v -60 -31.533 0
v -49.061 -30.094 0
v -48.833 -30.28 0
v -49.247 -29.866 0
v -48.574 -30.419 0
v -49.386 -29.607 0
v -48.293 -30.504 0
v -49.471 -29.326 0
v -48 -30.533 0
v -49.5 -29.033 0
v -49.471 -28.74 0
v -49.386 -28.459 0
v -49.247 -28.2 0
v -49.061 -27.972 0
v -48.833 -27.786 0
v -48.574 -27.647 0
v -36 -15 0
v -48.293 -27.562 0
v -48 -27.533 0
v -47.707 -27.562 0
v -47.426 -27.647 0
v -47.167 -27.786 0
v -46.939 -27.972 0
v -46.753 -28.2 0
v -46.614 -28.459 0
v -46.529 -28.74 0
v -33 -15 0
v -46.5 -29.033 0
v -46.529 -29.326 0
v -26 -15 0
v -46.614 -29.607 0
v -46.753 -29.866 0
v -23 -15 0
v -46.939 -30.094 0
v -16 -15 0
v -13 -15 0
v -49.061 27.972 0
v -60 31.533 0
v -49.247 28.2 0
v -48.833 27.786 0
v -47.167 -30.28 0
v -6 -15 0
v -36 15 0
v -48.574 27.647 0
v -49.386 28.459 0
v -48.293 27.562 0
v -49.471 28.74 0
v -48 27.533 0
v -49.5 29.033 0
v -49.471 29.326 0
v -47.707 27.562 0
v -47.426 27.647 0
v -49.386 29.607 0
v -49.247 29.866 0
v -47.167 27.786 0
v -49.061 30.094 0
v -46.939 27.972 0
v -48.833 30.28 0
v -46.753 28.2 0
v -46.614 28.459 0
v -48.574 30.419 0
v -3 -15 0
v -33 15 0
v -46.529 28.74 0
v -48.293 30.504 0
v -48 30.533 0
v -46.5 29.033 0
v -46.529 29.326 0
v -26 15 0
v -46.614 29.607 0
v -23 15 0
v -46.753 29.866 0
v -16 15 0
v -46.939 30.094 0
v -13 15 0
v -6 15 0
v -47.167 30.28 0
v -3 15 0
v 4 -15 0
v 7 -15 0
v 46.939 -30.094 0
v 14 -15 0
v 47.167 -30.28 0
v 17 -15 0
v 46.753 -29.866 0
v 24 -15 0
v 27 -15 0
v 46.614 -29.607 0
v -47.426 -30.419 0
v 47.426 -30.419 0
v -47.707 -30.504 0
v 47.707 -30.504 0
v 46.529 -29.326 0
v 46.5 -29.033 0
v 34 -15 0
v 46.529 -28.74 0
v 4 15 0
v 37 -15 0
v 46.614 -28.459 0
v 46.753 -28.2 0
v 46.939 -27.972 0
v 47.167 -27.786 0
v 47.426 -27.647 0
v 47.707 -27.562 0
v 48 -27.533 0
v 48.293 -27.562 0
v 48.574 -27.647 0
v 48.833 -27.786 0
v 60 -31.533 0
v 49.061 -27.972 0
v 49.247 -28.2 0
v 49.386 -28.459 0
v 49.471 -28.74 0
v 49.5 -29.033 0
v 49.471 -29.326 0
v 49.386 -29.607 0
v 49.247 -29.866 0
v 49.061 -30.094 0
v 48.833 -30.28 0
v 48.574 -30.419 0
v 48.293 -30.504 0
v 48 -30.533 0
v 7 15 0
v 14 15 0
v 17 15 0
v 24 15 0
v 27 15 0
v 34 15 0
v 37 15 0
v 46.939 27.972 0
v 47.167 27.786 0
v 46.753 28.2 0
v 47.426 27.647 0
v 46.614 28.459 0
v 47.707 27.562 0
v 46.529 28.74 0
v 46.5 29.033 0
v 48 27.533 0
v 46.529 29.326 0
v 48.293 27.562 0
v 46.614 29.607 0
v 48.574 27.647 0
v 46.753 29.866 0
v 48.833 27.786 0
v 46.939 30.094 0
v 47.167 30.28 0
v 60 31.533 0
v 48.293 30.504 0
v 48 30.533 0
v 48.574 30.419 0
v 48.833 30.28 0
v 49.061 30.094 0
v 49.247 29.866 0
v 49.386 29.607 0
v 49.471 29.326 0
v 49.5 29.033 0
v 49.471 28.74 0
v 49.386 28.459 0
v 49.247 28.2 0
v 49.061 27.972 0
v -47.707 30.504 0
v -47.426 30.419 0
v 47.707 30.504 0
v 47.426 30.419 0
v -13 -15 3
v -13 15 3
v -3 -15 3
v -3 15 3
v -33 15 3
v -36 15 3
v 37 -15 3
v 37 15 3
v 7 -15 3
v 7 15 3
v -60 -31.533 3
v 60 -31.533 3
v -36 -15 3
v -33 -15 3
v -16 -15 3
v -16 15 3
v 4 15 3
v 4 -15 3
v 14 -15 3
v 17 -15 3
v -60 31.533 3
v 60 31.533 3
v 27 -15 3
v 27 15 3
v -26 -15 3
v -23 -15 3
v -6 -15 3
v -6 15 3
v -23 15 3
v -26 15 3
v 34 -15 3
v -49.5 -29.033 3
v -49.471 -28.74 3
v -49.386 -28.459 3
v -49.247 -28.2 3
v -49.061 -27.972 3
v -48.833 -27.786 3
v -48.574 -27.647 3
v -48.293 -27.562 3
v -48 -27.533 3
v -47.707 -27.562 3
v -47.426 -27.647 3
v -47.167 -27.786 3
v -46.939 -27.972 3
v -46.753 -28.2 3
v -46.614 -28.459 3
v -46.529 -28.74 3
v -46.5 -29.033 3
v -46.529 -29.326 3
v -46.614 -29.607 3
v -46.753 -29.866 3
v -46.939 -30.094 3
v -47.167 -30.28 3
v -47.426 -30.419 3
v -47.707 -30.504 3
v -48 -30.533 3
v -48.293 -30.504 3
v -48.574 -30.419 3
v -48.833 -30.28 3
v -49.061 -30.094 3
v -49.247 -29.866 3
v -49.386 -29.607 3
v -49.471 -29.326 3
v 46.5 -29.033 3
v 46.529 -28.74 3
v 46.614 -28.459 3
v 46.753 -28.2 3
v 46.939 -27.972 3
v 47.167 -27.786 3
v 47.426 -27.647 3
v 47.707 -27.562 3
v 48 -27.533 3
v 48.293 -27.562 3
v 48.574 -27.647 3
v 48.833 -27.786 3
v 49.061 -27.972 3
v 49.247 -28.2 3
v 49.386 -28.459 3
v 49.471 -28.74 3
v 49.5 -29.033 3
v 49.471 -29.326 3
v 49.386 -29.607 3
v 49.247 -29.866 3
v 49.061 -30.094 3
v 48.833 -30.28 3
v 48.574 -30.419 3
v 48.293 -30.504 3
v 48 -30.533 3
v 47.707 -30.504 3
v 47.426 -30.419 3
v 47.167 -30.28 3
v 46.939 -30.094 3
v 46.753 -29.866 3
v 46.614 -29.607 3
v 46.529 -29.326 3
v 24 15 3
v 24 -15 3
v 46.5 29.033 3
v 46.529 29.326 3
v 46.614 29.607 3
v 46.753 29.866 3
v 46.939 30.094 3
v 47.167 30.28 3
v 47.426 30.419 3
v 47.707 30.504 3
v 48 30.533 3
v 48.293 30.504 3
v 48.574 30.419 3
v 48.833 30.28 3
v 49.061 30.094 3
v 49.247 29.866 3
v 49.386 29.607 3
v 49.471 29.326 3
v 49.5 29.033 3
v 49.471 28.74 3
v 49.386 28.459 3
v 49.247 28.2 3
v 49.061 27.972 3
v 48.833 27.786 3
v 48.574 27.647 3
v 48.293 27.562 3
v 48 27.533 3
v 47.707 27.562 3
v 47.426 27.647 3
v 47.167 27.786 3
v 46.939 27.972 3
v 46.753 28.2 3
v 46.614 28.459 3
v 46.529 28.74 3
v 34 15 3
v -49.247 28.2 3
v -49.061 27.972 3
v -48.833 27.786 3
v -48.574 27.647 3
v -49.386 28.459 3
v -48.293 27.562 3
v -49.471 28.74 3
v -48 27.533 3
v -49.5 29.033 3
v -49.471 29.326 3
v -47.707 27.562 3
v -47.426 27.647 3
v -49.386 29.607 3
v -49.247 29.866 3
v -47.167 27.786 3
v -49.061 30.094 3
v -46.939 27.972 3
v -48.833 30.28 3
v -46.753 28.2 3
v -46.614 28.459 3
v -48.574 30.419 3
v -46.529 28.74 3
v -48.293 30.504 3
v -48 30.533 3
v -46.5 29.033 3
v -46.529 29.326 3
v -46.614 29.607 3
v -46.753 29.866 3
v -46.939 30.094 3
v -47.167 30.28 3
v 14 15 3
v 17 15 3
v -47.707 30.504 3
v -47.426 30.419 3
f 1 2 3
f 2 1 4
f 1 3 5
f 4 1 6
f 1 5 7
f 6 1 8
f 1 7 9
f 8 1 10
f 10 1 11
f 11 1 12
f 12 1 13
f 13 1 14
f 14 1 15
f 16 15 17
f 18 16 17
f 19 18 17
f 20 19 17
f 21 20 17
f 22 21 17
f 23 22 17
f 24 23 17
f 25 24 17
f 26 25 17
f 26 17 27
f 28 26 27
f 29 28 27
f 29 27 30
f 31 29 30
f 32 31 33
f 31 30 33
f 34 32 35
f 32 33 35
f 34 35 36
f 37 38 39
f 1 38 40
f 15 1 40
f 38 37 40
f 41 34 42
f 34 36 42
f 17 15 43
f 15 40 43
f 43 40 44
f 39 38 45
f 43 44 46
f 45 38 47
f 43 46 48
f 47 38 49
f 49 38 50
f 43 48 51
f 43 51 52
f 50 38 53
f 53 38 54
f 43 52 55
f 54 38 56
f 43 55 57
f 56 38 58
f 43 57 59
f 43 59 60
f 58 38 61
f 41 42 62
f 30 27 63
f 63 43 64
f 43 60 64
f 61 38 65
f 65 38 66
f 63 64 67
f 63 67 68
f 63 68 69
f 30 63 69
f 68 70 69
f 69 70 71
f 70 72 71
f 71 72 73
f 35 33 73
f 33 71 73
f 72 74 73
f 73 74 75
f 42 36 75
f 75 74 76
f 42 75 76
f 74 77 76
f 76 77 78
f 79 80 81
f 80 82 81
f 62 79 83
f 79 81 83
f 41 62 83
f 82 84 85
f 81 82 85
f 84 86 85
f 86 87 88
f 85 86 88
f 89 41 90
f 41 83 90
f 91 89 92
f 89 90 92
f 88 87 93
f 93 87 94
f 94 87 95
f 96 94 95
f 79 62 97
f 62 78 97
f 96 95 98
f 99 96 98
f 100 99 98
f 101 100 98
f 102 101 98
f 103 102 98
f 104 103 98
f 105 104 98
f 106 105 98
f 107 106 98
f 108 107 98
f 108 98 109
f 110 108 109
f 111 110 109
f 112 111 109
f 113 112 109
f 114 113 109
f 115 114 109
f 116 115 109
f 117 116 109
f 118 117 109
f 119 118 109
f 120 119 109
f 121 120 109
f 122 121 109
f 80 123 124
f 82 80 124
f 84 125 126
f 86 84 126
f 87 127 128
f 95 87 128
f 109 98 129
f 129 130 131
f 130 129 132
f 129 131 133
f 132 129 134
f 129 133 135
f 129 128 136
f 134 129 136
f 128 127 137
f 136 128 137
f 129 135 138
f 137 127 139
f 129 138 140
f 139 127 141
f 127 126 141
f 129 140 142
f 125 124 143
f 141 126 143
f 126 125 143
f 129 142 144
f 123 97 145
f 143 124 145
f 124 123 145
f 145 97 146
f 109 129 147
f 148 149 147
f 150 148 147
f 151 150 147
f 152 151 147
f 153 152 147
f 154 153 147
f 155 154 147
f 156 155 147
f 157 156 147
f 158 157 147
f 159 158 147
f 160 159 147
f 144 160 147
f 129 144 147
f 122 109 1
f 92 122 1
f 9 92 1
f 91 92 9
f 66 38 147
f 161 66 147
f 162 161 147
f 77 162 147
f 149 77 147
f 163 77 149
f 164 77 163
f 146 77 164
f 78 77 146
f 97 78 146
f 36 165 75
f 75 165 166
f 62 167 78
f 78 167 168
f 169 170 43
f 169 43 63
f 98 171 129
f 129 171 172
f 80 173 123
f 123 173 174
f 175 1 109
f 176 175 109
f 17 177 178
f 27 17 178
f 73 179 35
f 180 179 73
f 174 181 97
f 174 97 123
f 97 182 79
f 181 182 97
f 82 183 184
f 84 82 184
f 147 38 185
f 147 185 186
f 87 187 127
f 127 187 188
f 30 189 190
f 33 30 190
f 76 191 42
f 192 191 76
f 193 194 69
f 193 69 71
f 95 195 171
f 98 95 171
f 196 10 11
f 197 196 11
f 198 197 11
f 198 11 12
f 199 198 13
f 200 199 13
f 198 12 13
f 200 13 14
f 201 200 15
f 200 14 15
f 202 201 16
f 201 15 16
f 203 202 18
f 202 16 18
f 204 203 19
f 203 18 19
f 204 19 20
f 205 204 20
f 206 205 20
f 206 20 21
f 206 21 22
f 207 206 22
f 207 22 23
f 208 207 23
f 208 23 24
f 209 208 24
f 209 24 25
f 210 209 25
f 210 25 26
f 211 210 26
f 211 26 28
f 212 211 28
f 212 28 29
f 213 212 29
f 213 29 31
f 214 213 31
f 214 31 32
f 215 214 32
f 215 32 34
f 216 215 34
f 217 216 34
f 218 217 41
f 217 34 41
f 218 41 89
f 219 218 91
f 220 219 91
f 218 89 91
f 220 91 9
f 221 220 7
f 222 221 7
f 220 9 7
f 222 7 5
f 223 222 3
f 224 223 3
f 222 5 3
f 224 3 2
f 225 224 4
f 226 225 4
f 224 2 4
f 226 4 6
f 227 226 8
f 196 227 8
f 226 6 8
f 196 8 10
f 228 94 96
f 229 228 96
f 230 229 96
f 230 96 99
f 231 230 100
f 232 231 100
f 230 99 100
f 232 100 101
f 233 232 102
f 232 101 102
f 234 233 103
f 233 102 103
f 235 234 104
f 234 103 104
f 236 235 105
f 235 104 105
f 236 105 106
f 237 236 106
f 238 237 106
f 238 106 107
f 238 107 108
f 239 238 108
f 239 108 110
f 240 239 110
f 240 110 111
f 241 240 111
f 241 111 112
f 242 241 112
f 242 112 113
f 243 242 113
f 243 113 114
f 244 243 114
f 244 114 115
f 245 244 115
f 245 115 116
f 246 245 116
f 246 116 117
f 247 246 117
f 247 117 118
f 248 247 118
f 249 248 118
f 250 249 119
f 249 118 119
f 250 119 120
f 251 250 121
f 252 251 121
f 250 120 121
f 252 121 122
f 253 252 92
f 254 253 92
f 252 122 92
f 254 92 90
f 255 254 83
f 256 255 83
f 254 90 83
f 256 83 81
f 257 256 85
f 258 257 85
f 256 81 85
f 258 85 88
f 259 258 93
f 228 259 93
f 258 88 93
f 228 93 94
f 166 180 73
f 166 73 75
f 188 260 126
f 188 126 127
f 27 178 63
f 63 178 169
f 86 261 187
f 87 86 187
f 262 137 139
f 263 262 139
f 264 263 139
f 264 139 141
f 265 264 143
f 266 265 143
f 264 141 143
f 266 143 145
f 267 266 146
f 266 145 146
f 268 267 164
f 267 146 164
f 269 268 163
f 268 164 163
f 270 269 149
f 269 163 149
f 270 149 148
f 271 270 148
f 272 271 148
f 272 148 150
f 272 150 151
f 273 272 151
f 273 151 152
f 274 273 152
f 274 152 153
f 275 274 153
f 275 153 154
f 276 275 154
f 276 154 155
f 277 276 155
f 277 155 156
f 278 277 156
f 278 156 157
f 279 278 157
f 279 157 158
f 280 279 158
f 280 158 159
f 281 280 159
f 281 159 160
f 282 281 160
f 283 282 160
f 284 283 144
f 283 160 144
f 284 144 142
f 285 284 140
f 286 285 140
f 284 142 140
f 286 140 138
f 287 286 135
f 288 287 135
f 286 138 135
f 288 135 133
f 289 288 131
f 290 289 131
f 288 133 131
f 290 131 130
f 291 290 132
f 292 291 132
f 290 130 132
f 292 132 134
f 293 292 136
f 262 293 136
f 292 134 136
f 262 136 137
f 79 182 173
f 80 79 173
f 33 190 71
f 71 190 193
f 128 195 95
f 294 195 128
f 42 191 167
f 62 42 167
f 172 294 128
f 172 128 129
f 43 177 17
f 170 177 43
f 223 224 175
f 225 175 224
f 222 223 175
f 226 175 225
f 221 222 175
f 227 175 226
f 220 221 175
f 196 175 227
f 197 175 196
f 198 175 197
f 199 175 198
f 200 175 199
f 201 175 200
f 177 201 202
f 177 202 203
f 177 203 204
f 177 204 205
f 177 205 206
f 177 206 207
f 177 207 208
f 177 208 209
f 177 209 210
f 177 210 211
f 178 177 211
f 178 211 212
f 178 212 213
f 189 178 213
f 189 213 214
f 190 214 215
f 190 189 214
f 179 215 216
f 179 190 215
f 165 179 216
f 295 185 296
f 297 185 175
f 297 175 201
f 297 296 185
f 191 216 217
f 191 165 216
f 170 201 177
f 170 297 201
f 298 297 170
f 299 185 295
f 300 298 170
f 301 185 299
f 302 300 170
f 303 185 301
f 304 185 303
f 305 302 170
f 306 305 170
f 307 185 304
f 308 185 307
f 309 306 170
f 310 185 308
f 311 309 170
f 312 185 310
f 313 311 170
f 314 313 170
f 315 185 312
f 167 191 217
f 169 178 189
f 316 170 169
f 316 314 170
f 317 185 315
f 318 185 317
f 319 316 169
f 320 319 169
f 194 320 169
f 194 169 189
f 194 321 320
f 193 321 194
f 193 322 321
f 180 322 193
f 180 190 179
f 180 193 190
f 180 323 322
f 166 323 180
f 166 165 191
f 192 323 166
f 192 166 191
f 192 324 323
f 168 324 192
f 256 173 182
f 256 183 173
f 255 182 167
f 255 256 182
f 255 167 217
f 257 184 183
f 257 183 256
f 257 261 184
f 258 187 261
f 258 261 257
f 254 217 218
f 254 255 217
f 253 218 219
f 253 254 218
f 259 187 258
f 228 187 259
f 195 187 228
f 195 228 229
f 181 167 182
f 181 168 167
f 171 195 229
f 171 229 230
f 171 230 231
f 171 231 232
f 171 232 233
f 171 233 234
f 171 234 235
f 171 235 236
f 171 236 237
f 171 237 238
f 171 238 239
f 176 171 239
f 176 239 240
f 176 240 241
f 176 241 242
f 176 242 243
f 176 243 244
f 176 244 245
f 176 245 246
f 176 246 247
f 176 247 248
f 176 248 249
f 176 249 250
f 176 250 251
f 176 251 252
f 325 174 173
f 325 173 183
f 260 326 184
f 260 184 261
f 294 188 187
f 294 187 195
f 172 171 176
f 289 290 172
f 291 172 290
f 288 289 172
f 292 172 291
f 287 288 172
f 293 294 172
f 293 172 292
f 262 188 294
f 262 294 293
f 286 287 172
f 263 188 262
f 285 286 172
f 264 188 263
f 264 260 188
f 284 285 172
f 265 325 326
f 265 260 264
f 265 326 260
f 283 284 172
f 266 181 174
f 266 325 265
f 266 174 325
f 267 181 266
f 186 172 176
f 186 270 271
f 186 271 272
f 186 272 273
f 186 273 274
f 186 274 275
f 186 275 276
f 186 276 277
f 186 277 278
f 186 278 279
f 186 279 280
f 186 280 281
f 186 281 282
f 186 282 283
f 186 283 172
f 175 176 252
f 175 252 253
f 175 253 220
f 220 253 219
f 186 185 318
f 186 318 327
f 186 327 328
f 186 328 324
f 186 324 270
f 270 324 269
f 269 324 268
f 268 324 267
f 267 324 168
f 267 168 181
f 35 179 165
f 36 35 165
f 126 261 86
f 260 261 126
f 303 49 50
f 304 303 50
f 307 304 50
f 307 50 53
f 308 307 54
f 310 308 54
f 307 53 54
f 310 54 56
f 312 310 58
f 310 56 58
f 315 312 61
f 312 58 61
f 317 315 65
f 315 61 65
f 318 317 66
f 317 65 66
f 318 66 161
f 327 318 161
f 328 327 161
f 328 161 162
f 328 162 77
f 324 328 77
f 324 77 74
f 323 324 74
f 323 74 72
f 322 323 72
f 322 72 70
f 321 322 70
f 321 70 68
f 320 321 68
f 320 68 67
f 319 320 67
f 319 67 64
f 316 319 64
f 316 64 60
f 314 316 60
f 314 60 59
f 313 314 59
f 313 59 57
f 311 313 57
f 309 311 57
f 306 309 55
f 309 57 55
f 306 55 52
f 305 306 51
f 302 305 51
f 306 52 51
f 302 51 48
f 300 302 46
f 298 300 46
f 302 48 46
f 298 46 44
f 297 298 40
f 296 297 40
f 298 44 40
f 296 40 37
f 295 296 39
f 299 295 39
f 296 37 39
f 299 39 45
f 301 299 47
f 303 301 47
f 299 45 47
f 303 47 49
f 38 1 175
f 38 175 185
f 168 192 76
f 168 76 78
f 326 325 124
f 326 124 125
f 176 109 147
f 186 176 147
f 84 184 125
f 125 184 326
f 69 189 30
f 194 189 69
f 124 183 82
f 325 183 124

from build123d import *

# Parameters (mm, degrees)
F0_W     = 120
F0_H     = 63.066
F1_DEPTH = 3
F3_D     = 3
F4_W     = 3
F4_H     = 30
F5_DEPTH = 3.001


with BuildPart() as f1:
    # F0 (on Top) → F1 (new body)
    with BuildSketch(Plane.XY):
        Rectangle(F0_W, F0_H)
    extrude(amount=F1_DEPTH)

    # F3 (through all)
    with Locations(Plane.XY.offset(3)):
        with Locations((-48, 29.033), (48, 29.033), (48, -29.033), (-48, -29.033)):
            Hole(F3_D / 2)

    # F4 (on face) → F5 (cut, through all)
    with BuildSketch(Plane.XY.offset(3)):
        with Locations((-34.4999431167, 0)):
            Rectangle(F4_W, F4_H)
        with Locations((-24.4999431167, 0)):
            Rectangle(F4_W, F4_H)
        with Locations((-14.4999431167, 0)):
            Rectangle(F4_W, F4_H)
        with Locations((5.5000568833, 0)):
            Rectangle(F4_W, F4_H)
        with Locations((-4.4999431167, 0)):
            Rectangle(F4_W, F4_H)
        with Locations((15.5000568833, 0)):
            Rectangle(F4_W, F4_H)
        with Locations((25.5000568833, 0)):
            Rectangle(F4_W, F4_H)
        with Locations((35.5000568833, 0)):
            Rectangle(F4_W, F4_H)
    extrude(amount=-F5_DEPTH, mode=Mode.SUBTRACT)


solid = f1.part
